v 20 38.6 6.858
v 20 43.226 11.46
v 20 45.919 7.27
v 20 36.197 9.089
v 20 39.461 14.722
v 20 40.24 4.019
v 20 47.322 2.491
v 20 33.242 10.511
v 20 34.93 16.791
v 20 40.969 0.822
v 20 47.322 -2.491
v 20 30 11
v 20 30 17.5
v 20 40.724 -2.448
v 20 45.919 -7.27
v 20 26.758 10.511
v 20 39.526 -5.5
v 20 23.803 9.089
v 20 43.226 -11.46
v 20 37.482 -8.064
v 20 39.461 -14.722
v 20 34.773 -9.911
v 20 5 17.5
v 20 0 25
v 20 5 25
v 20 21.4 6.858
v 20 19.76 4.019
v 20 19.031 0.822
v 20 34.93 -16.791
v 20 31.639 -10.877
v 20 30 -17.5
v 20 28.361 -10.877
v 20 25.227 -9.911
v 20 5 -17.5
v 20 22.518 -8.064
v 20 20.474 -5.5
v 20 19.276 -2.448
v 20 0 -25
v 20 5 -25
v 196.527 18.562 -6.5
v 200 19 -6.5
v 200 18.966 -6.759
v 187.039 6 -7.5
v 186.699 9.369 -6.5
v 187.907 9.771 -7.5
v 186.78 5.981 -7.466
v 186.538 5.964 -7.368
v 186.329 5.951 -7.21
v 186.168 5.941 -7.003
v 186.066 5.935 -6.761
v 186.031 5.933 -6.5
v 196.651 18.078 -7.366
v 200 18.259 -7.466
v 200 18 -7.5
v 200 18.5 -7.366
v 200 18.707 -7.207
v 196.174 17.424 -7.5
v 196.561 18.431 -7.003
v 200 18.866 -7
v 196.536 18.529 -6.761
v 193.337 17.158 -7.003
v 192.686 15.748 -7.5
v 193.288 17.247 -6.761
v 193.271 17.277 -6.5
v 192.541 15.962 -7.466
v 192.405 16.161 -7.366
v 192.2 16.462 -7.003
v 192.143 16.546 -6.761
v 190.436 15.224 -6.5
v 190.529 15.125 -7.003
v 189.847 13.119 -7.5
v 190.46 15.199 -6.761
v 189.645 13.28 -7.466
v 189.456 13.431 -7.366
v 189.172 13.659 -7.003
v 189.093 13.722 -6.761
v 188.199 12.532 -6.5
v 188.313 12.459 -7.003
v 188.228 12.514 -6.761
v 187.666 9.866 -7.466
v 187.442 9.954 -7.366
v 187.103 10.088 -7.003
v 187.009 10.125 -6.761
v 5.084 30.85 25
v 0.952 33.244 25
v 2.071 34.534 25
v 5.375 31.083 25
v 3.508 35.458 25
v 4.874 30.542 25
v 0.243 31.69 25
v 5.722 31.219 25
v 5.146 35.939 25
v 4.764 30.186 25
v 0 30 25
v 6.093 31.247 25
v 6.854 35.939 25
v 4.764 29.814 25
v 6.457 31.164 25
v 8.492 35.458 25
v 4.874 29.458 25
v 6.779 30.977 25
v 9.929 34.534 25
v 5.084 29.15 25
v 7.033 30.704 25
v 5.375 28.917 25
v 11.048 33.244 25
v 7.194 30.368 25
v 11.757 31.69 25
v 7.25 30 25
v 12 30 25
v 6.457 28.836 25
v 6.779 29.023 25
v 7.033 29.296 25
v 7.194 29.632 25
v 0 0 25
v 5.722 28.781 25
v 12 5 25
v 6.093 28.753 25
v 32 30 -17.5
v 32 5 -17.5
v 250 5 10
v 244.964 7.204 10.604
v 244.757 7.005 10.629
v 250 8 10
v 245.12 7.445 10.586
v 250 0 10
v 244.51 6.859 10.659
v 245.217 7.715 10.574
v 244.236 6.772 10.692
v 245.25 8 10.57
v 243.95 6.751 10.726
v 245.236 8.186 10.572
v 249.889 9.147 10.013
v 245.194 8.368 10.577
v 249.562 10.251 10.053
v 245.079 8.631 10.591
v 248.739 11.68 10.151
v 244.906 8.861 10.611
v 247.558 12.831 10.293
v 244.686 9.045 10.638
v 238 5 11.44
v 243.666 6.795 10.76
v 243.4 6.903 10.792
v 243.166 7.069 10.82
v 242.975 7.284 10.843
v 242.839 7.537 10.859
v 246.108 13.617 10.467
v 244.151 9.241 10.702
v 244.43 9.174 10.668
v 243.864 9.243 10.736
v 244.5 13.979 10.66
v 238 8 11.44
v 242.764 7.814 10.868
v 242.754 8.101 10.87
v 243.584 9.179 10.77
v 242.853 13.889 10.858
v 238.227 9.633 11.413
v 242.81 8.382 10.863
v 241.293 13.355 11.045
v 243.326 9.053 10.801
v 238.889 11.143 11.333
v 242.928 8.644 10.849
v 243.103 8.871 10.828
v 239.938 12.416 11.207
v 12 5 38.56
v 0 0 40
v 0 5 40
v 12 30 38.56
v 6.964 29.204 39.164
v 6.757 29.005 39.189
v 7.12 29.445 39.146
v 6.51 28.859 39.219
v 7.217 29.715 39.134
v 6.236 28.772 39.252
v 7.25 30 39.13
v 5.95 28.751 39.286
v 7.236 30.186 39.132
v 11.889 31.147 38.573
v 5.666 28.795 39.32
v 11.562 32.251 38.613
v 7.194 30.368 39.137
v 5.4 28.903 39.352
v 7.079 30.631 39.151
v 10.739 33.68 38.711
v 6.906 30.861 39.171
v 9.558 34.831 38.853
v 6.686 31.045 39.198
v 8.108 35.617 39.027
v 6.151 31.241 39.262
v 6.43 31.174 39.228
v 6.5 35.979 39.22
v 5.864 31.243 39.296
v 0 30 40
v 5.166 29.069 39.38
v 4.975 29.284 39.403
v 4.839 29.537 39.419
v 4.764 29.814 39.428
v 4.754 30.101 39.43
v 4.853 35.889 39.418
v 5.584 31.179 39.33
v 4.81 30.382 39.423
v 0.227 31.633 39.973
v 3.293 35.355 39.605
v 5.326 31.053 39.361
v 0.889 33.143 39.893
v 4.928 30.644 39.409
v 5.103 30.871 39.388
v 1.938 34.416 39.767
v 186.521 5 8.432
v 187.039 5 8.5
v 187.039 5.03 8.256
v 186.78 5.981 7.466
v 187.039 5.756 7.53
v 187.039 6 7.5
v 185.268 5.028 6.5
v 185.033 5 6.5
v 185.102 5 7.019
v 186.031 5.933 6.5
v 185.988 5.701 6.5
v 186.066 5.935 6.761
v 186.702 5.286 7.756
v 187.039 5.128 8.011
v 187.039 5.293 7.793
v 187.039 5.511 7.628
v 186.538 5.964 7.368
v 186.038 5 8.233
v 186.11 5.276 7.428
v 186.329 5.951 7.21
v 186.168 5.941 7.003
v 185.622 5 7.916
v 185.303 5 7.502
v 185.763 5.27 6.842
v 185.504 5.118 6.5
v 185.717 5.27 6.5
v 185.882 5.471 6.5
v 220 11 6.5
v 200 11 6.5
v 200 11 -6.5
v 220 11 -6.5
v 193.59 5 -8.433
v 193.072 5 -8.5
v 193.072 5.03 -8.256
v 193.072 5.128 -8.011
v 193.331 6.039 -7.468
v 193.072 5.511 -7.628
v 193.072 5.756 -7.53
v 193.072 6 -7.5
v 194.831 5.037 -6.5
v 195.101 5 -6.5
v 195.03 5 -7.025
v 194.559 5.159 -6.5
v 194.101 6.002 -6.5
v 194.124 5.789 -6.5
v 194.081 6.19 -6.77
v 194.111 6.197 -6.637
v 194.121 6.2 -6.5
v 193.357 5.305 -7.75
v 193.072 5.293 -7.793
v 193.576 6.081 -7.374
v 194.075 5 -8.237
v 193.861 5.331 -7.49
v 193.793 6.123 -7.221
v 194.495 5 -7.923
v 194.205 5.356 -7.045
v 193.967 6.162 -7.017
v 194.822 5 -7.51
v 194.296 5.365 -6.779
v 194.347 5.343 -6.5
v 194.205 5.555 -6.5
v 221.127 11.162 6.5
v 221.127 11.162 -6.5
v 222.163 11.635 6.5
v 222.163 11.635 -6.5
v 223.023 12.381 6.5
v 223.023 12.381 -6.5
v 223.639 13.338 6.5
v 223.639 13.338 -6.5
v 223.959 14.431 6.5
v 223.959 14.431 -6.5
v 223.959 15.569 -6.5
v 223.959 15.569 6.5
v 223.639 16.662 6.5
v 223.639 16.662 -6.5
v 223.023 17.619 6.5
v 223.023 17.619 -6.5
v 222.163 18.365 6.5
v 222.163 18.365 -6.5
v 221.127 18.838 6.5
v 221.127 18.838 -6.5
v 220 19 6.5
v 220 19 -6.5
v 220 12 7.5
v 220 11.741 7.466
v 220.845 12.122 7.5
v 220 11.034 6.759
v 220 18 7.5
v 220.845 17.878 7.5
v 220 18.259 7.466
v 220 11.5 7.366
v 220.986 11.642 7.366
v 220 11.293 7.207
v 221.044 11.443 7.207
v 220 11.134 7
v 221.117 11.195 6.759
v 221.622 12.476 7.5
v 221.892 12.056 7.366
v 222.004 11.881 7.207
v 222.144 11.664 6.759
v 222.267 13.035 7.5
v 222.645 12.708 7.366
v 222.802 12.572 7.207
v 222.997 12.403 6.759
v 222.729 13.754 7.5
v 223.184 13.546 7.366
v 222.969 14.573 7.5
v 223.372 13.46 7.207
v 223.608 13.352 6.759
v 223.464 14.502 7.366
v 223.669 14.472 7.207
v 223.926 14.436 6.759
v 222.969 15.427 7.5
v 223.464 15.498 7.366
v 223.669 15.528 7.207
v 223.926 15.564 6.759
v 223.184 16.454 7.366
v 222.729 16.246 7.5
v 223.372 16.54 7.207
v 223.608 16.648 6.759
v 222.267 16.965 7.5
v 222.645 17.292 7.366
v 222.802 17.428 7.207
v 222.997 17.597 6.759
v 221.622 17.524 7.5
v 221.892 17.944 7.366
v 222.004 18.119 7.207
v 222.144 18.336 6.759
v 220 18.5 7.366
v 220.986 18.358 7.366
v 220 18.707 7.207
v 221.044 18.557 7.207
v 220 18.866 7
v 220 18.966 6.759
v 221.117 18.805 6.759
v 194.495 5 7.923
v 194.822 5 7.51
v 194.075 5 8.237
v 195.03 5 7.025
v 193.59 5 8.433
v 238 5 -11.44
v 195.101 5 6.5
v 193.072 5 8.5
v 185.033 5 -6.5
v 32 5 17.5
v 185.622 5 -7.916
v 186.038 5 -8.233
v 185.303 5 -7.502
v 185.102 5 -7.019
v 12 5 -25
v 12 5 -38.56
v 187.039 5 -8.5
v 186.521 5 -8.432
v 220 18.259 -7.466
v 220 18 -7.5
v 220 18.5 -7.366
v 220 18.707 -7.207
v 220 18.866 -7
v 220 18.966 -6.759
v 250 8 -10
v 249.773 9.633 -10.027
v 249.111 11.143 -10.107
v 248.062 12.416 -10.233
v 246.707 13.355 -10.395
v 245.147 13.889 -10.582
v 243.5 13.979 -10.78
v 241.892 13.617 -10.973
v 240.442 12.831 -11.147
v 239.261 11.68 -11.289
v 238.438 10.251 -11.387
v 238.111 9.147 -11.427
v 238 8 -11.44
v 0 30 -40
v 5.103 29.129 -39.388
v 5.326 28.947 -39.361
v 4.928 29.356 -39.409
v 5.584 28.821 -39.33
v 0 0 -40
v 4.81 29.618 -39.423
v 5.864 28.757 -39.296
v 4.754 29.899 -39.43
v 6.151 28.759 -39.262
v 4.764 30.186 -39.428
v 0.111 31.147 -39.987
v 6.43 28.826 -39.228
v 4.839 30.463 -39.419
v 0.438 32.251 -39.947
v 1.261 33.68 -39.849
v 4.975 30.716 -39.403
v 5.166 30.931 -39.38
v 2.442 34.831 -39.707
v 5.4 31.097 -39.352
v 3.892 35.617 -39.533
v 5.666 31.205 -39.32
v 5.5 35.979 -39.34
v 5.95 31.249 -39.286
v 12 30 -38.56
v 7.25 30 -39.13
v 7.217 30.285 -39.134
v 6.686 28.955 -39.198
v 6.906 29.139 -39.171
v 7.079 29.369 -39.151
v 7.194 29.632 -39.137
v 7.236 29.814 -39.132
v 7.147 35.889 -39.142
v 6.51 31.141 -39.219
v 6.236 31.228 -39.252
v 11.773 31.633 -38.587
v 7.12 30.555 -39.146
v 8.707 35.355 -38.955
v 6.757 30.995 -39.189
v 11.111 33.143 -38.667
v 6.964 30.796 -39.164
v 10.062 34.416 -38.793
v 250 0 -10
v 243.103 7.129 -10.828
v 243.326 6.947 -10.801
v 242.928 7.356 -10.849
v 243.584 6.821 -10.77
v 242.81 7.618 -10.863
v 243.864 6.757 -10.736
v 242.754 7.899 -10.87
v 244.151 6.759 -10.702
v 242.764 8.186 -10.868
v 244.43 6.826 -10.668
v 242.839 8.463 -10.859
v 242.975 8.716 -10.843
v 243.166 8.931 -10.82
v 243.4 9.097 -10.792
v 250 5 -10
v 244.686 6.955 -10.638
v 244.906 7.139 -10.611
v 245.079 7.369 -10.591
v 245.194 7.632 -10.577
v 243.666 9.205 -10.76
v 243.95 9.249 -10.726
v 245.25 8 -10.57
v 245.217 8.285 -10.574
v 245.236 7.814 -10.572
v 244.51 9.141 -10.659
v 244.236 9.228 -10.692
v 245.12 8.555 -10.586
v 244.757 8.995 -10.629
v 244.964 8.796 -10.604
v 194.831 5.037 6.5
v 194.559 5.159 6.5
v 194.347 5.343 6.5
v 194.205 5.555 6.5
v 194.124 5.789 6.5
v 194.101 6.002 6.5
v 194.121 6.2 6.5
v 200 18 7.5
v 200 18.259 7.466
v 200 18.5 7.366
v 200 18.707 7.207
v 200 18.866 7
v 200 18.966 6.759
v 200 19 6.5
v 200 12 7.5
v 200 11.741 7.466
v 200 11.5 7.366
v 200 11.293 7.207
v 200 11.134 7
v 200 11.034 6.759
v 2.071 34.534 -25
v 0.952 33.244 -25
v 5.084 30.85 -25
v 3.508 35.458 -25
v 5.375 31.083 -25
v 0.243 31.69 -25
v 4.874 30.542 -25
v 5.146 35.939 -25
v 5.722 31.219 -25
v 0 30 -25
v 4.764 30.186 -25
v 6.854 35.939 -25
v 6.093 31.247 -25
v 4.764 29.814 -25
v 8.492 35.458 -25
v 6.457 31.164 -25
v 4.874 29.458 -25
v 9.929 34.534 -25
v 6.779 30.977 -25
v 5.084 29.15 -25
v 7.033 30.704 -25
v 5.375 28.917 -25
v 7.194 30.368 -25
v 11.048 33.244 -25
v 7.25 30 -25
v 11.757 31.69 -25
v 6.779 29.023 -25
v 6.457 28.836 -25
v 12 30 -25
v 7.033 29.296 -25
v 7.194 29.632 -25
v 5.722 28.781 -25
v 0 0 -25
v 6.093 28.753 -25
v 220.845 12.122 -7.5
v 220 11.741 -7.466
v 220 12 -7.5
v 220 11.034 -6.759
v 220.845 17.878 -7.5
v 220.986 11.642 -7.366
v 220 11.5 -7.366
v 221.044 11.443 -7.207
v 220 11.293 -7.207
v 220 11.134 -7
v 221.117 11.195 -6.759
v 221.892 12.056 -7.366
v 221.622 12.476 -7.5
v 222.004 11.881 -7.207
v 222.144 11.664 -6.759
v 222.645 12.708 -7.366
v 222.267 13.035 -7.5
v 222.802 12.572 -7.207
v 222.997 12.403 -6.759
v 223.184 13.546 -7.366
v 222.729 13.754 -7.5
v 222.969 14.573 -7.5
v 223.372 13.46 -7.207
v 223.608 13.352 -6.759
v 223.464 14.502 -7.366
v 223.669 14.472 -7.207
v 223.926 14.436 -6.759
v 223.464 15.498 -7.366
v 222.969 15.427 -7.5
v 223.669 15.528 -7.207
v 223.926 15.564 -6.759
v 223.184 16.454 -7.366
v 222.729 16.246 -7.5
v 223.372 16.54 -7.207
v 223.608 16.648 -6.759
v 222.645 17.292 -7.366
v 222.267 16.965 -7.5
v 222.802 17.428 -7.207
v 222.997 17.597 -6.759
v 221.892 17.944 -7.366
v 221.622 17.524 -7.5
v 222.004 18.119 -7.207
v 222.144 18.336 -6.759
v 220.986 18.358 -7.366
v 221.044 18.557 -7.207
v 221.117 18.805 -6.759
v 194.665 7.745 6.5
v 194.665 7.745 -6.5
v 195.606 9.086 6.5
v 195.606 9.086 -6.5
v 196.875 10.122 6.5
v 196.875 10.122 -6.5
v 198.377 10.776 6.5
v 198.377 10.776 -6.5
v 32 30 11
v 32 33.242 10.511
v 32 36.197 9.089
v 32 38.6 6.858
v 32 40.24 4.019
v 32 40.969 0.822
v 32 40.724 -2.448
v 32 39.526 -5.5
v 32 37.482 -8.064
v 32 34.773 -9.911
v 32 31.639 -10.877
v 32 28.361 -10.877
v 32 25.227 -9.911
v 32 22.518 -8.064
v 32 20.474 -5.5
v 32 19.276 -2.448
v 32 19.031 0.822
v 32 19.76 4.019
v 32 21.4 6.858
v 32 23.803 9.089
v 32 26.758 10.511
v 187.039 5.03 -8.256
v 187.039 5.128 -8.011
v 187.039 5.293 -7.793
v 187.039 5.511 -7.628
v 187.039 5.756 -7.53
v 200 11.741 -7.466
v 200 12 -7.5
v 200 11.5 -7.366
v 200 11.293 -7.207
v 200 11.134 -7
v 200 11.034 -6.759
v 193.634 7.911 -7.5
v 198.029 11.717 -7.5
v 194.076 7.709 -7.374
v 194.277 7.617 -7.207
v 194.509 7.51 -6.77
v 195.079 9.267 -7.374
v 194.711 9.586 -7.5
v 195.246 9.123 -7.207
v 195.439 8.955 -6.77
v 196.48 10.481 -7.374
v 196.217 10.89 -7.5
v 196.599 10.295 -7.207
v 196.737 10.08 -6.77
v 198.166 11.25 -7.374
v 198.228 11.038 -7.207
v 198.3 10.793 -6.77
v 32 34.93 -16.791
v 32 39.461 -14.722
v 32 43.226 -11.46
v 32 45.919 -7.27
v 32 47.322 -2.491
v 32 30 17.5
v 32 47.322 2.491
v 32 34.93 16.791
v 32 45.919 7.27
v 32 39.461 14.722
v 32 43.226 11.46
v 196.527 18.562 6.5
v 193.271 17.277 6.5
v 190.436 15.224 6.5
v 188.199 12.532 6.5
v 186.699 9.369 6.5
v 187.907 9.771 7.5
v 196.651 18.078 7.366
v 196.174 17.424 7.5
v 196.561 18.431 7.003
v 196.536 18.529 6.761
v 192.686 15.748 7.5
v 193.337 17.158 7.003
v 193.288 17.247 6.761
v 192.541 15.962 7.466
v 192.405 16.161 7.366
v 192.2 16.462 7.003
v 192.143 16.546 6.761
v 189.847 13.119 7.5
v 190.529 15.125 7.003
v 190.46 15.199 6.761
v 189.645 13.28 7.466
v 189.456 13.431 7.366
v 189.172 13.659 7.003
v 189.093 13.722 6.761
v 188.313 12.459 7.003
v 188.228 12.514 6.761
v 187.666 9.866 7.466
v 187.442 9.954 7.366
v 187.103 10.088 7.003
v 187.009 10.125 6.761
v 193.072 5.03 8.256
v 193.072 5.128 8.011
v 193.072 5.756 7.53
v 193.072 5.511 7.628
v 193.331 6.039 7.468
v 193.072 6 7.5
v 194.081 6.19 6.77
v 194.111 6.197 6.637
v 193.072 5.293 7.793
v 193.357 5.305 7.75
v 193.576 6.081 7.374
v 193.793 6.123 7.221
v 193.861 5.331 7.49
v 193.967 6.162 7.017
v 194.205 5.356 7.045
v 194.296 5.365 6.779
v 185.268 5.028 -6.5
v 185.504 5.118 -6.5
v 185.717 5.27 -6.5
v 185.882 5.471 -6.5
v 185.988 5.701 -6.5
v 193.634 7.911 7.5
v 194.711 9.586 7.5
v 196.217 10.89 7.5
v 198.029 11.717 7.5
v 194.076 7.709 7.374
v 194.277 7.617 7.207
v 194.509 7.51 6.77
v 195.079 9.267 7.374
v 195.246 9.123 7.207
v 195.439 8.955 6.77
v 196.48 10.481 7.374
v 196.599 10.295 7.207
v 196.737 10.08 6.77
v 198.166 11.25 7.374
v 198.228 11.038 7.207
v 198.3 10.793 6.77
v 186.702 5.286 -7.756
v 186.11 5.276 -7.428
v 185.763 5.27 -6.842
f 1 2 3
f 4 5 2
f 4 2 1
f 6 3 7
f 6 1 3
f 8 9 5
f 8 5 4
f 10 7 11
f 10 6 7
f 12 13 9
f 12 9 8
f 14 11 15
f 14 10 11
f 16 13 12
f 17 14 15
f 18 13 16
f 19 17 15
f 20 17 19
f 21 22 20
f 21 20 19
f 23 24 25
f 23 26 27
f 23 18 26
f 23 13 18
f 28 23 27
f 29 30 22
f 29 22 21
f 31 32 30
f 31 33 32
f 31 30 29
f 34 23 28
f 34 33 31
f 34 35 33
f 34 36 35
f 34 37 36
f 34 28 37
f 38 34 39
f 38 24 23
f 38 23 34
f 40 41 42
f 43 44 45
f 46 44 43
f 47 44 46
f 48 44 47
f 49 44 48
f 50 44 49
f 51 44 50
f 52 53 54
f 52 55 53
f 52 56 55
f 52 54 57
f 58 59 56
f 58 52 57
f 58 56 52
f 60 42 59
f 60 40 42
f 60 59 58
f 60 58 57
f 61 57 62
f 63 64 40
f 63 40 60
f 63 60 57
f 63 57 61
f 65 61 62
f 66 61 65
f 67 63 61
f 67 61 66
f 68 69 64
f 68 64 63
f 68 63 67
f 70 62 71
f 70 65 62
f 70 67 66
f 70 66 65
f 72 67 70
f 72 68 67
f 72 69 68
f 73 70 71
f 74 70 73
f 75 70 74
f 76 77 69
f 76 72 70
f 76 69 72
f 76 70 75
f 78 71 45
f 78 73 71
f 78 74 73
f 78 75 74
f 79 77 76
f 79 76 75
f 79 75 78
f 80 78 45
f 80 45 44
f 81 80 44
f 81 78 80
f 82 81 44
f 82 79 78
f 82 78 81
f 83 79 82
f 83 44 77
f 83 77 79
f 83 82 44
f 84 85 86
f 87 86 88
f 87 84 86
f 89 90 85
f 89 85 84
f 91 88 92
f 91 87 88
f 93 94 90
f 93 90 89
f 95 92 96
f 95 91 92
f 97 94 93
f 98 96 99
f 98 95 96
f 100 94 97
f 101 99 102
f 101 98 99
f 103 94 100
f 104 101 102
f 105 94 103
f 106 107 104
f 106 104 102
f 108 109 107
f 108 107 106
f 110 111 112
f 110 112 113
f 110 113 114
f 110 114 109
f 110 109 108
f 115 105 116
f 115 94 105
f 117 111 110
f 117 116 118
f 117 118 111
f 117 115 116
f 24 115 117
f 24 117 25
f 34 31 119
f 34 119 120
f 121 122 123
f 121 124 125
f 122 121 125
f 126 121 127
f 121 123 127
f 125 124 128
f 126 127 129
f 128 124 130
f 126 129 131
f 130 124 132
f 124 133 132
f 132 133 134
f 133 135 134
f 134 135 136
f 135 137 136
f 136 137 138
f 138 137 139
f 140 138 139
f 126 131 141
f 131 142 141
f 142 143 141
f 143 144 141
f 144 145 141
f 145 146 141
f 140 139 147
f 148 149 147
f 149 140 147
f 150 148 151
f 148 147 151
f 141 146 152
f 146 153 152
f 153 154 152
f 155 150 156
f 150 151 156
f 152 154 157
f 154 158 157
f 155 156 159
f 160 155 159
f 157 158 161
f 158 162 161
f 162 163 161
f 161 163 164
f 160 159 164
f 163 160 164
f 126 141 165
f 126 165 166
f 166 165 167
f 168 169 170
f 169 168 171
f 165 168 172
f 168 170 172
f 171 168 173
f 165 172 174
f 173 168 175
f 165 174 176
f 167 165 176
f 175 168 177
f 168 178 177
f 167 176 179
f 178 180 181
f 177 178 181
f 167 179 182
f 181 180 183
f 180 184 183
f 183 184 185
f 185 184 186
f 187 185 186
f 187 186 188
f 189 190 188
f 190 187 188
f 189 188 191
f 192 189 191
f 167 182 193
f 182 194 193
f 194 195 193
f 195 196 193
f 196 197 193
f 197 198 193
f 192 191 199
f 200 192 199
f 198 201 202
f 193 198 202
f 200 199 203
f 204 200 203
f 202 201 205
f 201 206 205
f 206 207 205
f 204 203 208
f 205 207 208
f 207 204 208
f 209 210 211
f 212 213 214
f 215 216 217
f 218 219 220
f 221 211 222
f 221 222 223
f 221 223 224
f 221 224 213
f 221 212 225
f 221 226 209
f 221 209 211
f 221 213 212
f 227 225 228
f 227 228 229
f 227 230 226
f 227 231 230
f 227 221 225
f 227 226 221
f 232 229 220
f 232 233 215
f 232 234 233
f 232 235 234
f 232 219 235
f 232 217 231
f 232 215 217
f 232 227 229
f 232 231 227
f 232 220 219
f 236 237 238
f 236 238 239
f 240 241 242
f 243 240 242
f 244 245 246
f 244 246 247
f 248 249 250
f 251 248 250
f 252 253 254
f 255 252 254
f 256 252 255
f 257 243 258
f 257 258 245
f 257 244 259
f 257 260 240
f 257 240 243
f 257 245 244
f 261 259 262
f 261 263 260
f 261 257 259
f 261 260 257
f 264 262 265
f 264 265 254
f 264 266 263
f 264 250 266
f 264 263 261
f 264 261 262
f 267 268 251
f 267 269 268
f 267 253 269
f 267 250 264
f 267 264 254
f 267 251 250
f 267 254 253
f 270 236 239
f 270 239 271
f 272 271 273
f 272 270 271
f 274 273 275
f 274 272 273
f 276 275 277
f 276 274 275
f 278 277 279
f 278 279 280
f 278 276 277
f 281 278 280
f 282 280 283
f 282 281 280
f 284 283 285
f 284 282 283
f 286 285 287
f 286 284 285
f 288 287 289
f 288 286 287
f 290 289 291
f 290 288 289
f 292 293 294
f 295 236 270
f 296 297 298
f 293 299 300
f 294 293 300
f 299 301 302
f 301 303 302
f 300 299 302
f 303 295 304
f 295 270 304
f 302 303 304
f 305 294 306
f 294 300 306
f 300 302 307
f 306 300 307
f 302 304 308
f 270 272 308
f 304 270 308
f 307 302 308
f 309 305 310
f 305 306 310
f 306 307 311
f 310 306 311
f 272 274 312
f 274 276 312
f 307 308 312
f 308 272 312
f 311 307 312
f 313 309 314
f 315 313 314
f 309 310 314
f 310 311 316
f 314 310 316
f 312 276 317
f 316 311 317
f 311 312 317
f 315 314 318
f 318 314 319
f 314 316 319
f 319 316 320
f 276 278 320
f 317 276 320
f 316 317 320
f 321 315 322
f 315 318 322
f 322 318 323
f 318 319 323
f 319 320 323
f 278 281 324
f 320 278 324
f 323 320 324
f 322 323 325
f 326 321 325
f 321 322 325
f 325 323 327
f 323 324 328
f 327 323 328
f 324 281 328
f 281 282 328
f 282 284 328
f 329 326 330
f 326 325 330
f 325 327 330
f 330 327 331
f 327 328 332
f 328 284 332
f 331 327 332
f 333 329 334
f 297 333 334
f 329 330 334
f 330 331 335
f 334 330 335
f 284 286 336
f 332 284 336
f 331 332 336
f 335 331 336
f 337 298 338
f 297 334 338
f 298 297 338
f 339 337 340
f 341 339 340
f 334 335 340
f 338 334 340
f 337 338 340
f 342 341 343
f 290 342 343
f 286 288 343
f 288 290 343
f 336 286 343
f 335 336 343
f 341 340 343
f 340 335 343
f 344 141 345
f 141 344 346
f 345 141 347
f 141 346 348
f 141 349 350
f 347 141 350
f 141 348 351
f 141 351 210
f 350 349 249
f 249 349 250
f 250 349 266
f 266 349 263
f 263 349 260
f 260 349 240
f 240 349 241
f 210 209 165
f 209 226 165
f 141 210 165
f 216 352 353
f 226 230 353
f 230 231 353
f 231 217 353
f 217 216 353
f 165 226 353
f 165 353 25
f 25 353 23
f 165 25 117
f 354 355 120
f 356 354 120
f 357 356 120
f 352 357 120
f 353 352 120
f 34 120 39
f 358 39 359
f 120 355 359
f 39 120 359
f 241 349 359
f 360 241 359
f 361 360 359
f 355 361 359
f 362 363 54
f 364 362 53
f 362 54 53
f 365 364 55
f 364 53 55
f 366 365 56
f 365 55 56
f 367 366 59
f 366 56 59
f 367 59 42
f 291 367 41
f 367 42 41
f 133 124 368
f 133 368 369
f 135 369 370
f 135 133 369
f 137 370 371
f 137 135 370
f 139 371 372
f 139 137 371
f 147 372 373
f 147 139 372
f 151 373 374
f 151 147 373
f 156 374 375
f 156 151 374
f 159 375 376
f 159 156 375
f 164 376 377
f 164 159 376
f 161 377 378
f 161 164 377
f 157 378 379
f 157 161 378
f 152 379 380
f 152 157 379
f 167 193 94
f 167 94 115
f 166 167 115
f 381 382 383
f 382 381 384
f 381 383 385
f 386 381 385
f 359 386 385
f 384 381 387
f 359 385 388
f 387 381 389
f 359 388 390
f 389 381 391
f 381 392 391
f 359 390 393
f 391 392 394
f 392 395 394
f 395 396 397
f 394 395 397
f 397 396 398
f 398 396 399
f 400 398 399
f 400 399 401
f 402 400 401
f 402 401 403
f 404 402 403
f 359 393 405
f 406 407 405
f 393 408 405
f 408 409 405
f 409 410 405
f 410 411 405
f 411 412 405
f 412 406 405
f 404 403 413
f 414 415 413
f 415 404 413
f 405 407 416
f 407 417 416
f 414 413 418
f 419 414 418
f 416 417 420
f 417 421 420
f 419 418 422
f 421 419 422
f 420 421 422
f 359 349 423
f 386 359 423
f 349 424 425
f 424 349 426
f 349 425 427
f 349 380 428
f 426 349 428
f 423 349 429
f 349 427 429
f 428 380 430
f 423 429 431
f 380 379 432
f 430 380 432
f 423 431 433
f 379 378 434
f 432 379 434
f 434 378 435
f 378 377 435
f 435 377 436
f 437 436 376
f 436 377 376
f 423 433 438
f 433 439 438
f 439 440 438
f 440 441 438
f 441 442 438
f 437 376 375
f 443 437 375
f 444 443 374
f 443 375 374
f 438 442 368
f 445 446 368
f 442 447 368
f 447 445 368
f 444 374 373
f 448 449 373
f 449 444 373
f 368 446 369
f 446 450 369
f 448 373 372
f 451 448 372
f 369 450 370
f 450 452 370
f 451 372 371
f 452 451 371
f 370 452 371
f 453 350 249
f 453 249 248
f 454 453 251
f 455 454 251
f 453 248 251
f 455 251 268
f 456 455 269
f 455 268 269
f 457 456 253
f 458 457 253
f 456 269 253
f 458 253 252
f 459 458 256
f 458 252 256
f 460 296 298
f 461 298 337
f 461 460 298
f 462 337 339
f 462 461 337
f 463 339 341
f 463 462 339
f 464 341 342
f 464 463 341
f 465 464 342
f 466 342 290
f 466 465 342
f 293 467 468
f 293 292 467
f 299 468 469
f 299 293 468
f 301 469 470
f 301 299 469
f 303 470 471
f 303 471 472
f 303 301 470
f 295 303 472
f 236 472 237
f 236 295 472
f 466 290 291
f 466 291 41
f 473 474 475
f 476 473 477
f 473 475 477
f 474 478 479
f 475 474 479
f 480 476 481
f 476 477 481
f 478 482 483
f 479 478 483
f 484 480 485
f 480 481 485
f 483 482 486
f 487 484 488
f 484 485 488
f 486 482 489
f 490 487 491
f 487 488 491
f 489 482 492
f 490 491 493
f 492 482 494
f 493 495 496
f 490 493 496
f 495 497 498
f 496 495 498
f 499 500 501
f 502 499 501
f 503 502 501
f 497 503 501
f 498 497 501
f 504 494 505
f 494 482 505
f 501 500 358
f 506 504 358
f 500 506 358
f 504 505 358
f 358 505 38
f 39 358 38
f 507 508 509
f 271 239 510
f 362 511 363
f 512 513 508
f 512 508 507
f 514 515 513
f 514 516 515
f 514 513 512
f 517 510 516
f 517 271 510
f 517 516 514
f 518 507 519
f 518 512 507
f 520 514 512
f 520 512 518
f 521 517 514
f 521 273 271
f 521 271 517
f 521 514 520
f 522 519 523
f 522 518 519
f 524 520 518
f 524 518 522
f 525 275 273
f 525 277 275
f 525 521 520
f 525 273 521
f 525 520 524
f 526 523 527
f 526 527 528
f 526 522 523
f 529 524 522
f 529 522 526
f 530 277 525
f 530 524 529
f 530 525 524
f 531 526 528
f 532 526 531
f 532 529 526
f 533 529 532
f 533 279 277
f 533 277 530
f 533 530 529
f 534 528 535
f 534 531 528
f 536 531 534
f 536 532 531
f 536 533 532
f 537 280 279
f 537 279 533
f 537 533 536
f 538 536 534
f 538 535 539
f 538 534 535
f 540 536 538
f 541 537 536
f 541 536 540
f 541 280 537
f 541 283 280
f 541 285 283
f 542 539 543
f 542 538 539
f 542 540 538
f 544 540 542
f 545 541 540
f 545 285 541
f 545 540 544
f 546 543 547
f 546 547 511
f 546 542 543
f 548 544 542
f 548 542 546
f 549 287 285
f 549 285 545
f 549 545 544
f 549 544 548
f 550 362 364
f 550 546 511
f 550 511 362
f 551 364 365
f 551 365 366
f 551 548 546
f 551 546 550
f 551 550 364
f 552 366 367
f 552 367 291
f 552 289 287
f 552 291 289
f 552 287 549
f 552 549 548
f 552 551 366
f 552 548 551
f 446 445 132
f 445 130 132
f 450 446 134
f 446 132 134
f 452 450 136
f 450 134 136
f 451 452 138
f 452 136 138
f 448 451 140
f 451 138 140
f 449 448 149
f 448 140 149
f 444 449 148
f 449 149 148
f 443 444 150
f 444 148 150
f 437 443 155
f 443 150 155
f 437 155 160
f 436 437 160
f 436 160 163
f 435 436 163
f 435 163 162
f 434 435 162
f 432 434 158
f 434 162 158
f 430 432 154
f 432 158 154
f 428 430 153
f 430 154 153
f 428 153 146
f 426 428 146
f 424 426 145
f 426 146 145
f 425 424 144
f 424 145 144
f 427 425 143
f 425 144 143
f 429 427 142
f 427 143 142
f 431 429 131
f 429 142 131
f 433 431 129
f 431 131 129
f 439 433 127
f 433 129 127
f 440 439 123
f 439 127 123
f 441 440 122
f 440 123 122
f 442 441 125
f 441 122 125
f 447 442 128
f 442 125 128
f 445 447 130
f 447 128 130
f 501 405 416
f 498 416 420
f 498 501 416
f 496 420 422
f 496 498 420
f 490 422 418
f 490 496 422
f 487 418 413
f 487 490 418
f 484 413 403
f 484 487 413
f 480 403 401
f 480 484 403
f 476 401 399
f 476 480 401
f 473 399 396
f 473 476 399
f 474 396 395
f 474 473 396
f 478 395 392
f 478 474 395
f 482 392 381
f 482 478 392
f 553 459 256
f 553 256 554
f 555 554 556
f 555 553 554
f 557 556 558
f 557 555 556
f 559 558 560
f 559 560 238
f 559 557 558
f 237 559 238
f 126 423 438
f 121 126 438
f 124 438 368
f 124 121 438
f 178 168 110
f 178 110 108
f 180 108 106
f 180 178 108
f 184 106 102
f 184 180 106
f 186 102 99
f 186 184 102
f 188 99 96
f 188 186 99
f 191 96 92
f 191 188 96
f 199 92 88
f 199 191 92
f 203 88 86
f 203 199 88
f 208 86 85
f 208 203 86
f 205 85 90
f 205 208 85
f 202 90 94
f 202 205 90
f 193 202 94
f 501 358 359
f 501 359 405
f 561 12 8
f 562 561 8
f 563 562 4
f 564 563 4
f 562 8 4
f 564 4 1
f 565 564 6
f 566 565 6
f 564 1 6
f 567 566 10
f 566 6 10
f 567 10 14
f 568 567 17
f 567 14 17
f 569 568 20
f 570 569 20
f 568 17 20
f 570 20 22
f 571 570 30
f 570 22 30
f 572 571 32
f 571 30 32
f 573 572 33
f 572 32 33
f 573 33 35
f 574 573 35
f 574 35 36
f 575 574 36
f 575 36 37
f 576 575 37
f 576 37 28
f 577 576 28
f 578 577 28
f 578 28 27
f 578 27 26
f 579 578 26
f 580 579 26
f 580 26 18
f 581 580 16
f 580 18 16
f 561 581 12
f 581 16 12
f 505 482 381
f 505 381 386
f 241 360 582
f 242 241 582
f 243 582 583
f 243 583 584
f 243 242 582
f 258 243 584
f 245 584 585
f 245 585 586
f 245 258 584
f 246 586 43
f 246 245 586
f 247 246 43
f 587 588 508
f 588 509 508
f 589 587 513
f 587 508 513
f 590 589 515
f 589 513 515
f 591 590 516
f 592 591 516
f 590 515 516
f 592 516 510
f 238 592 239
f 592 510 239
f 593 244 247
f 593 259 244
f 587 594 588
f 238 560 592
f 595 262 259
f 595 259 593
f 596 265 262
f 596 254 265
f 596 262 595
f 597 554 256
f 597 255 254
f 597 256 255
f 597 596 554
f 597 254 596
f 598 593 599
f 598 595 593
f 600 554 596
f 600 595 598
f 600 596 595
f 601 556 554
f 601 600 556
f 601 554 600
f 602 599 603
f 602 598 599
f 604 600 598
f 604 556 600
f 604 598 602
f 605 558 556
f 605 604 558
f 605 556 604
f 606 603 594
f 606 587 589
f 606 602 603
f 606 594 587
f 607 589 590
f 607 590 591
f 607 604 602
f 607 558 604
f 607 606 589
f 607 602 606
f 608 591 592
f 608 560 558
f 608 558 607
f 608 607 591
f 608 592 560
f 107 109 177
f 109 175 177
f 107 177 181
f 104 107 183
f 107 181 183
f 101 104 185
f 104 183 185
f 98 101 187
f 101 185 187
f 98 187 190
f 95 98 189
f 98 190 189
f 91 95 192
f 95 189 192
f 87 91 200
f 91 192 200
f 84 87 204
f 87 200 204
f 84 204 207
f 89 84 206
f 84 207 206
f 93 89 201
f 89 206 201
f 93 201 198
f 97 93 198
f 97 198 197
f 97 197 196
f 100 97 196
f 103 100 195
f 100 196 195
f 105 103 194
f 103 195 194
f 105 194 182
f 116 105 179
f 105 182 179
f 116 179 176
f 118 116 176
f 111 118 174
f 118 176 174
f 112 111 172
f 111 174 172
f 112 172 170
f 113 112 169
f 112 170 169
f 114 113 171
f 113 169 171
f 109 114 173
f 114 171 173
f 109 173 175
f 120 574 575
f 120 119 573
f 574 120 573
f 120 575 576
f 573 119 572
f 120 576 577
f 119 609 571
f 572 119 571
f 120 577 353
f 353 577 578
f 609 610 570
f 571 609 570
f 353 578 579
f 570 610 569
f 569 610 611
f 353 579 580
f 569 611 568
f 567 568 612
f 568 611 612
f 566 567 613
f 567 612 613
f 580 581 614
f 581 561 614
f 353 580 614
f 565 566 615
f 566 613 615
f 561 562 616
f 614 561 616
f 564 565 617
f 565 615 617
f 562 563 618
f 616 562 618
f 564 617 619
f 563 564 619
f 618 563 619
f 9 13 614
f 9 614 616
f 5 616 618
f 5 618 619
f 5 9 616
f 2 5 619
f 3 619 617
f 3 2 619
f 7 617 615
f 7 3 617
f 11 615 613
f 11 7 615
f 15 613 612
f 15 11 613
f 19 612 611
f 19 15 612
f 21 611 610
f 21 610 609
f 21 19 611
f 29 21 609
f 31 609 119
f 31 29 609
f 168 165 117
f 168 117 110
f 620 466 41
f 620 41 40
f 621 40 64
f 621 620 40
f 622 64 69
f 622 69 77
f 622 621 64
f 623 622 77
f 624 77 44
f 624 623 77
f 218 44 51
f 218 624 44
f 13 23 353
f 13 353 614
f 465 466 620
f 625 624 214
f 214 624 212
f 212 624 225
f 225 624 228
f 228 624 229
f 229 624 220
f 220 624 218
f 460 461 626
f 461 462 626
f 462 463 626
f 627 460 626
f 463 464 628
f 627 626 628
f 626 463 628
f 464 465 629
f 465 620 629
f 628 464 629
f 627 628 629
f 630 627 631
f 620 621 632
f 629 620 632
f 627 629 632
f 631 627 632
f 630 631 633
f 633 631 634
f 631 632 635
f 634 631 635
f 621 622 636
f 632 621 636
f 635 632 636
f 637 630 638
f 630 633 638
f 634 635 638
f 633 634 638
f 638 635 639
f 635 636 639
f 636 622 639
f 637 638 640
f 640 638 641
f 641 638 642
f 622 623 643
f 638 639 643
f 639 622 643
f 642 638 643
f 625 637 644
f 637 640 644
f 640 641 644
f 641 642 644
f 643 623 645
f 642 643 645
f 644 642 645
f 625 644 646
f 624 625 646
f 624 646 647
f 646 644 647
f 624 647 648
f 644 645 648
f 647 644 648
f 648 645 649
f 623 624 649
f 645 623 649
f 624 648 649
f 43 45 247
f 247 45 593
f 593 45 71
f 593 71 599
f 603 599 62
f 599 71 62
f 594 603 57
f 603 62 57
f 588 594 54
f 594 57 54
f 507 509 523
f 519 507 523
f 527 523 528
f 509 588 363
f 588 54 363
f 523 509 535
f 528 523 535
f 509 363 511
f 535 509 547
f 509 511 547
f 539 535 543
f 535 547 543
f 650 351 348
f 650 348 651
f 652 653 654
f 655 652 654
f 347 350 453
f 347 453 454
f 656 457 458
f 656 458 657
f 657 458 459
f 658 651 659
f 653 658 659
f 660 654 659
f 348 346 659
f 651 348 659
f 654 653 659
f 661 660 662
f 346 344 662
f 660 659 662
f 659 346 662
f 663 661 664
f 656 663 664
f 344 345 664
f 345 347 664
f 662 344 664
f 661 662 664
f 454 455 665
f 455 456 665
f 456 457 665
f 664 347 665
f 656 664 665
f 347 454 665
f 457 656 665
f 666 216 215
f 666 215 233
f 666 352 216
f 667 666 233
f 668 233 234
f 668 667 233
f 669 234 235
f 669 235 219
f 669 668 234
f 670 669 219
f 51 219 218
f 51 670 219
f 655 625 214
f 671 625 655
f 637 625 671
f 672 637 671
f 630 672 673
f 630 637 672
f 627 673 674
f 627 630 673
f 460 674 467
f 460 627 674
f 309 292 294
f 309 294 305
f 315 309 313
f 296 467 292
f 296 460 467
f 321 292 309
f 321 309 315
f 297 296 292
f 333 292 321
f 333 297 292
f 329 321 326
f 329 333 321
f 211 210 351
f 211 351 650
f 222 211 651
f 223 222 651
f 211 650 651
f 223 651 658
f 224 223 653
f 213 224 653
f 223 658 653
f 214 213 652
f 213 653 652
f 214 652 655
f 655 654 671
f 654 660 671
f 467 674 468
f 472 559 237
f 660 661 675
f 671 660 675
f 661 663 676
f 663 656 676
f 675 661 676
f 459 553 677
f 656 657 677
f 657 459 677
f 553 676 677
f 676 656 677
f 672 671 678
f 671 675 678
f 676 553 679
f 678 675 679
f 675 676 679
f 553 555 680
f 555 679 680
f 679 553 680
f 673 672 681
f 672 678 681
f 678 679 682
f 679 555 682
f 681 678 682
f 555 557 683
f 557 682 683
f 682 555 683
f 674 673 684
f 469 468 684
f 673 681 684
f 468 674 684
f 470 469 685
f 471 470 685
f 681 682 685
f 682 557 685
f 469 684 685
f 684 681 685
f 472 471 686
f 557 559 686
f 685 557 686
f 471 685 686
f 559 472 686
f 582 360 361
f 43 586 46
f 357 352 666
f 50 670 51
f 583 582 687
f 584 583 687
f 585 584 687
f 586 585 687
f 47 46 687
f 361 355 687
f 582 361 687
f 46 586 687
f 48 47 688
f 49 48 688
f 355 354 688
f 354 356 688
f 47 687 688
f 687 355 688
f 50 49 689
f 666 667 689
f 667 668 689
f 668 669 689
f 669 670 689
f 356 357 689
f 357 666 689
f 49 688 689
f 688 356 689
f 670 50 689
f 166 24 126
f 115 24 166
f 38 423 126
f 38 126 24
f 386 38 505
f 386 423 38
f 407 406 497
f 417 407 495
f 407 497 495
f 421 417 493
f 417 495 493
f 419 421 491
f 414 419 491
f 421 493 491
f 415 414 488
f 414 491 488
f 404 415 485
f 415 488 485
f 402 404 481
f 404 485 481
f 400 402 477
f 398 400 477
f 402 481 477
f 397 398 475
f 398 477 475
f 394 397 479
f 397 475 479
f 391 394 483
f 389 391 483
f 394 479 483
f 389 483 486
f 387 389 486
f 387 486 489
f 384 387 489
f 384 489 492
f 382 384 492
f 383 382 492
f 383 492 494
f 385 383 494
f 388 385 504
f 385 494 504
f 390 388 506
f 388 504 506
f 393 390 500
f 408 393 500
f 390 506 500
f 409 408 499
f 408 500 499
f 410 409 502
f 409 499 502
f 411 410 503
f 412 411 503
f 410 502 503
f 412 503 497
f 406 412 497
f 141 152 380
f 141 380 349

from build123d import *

# Parameters (mm, degrees)
BOSS_EXTRUDE1_DEPTH             = 5
BOSS_EXTRUDE2_REACH             = 255.229
SKETCH2_R                       = 1.25
BOSS_EXTRUDE2_DIRECTION_2_REACH = 255.229
CUT_EXTRUDE1_DEPTH              = 256.726416312
CUT_EXTRUDE1_DEPTH_BACK         = 256.726416312
SKETCH4_W                       = 20
SKETCH4_H                       = 50
SKETCH5_R                       = 11
BOSS_EXTRUDE3_DEPTH             = 12
BOSS_EXTRUDE4_DEPTH             = 7.5
FILLET1_R                       = 1


with BuildPart() as part:
    # Sketch1 → Boss-Extrude1 (new body)
    with BuildSketch(Plane(origin=(0, 0, 0), x_dir=(1, 0, 0), z_dir=(0, 1, 0))):
        Polygon((0, -40), (0, 40), (250, 10), (250, -10), align=None)
    extrude(amount=BOSS_EXTRUDE1_DEPTH)

    # Boss-Extrude2: up to this plane
    boss_extrude2_end = Plane(origin=(4.731861199, 5, 39.432176656), z_dir=(-0.11914522061843066, 0, -0.9928768384869221))
    # Sketch2 → Boss-Extrude2 (add, up to the surface)
    with BuildSketch(Plane.XY, mode=Mode.PRIVATE) as boss_extrude2_sk1:
        with BuildLine():
            Line((0, 30), (0, 5))
            Line((0, 5), (12, 5))
            Line((12, 5), (12, 30))
            ThreePointArc((12, 30), (6, 36), (0, 30))
        make_face()
        with Locations((6, 30)):
            Circle(SKETCH2_R, mode=Mode.SUBTRACT)
    boss_extrude2_tool1 = split(extrude(boss_extrude2_sk1.sketch, amount=BOSS_EXTRUDE2_REACH, mode=Mode.PRIVATE), bisect_by=boss_extrude2_end, keep=Keep.BOTH, mode=Mode.PRIVATE)
    add(boss_extrude2_tool1.solids().sort_by_distance((6, 19.745192, 0))[0])
    # Sketch2 → Boss-Extrude2 (add, up to the surface)
    with BuildSketch(Plane.XY, mode=Mode.PRIVATE) as boss_extrude2_sk2:
        with BuildLine():
            Line((238, 8), (238, 5))
            Line((238, 5), (250, 5))
            Line((250, 5), (250, 8))
            ThreePointArc((250, 8), (244, 14), (238, 8))
        make_face()
        with Locations((244, 8)):
            Circle(SKETCH2_R, mode=Mode.SUBTRACT)
    boss_extrude2_tool2 = split(extrude(boss_extrude2_sk2.sketch, amount=BOSS_EXTRUDE2_REACH, mode=Mode.PRIVATE), bisect_by=boss_extrude2_end, keep=Keep.BOTH, mode=Mode.PRIVATE)
    add(boss_extrude2_tool2.solids().sort_by_distance((244, 13.85, 0))[0])

    # Boss-Extrude2 direction 2: up to this plane
    boss_extrude2_direction_2_end = Plane(origin=(4.731861199, 5, -39.432176656), z_dir=(-0.11914522061843066, 0, 0.9928768384869221))
    # Sketch2 → Boss-Extrude2 direction 2 (add, up to the surface)
    with BuildSketch(Plane.XY, mode=Mode.PRIVATE) as boss_extrude2_direction_2_sk1:
        with BuildLine():
            Line((0, 30), (0, 5))
            Line((0, 5), (12, 5))
            Line((12, 5), (12, 30))
            ThreePointArc((12, 30), (6, 36), (0, 30))
        make_face()
        with Locations((6, 30)):
            Circle(SKETCH2_R, mode=Mode.SUBTRACT)
    boss_extrude2_direction_2_tool1 = split(extrude(boss_extrude2_direction_2_sk1.sketch, amount=-BOSS_EXTRUDE2_DIRECTION_2_REACH, mode=Mode.PRIVATE), bisect_by=boss_extrude2_direction_2_end, keep=Keep.BOTH, mode=Mode.PRIVATE)
    add(boss_extrude2_direction_2_tool1.solids().sort_by_distance((6, 19.745192, 0))[0])
    # Sketch2 → Boss-Extrude2 direction 2 (add, up to the surface)
    with BuildSketch(Plane.XY, mode=Mode.PRIVATE) as boss_extrude2_direction_2_sk2:
        with BuildLine():
            Line((238, 8), (238, 5))
            Line((238, 5), (250, 5))
            Line((250, 5), (250, 8))
            ThreePointArc((250, 8), (244, 14), (238, 8))
        make_face()
        with Locations((244, 8)):
            Circle(SKETCH2_R, mode=Mode.SUBTRACT)
    boss_extrude2_direction_2_tool2 = split(extrude(boss_extrude2_direction_2_sk2.sketch, amount=-BOSS_EXTRUDE2_DIRECTION_2_REACH, mode=Mode.PRIVATE), bisect_by=boss_extrude2_direction_2_end, keep=Keep.BOTH, mode=Mode.PRIVATE)
    add(boss_extrude2_direction_2_tool2.solids().sort_by_distance((244, 13.85, 0))[0])

    # Sketch4 → Cut-Extrude1 (cut, two sides: drawn at the far end of the back side and taken through both)
    with BuildSketch(Plane(origin=(0, 0, 0), x_dir=(1, 0, 0), z_dir=(0, 1, 0)).offset(-CUT_EXTRUDE1_DEPTH_BACK)):
        with Locations((10, 0)):
            Rectangle(SKETCH4_W, SKETCH4_H)
    extrude(amount=CUT_EXTRUDE1_DEPTH + CUT_EXTRUDE1_DEPTH_BACK, mode=Mode.SUBTRACT)

    # Sketch5 → Boss-Extrude3 (add)
    with BuildSketch(Plane.ZY.offset(-20)):
        with BuildLine():
            Line((-17.5, 30), (-17.5, 5))
            Line((-17.5, 5), (17.5, 5))
            Line((17.5, 5), (17.5, 30))
            ThreePointArc((17.5, 30), (0, 47.5), (-17.5, 30))
        make_face()
        with Locations((0, 30)):
            Circle(SKETCH5_R, mode=Mode.SUBTRACT)
    extrude(amount=-BOSS_EXTRUDE3_DEPTH)

    # Sketch6 → Boss-Extrude4 (add, symmetric)
    with BuildSketch(Plane.XY):
        with BuildLine():
            Line((200, 11), (220, 11))
            ThreePointArc((220, 11), (224, 15), (220, 19))
            Line((220, 19), (200, 19))
            ThreePointArc((200, 19), (190.100505063, 14.899494937), (186, 5))
            Line((186, 5), (194, 5))
            ThreePointArc((194, 5), (195.757359313, 9.242640687), (200, 11))
        make_face()
    extrude(amount=BOSS_EXTRUDE4_DEPTH, both=True)

    # Fillet1
    fillet1_edges = [part.edges().sort_by_distance(p)[0] for p in [
        (224, 15, -7.5),
        (210, 19, -7.5),
        (190.100505063, 14.899494937, -7.5),
        (190, 5, -7.5),
        (186, 5, 0),
        (195.757359313, 9.242640687, -7.5),
        (194, 5, 0),
        (210, 11, -7.5),
        (224, 15, 7.5),
        (210, 19, 7.5),
        (190.100505063, 14.899494937, 7.5),
        (190, 5, 7.5),
        (195.757359313, 9.242640687, 7.5),
        (210, 11, 7.5),
    ]]
    fillet(fillet1_edges, radius=FILLET1_R)


solid = part.part
